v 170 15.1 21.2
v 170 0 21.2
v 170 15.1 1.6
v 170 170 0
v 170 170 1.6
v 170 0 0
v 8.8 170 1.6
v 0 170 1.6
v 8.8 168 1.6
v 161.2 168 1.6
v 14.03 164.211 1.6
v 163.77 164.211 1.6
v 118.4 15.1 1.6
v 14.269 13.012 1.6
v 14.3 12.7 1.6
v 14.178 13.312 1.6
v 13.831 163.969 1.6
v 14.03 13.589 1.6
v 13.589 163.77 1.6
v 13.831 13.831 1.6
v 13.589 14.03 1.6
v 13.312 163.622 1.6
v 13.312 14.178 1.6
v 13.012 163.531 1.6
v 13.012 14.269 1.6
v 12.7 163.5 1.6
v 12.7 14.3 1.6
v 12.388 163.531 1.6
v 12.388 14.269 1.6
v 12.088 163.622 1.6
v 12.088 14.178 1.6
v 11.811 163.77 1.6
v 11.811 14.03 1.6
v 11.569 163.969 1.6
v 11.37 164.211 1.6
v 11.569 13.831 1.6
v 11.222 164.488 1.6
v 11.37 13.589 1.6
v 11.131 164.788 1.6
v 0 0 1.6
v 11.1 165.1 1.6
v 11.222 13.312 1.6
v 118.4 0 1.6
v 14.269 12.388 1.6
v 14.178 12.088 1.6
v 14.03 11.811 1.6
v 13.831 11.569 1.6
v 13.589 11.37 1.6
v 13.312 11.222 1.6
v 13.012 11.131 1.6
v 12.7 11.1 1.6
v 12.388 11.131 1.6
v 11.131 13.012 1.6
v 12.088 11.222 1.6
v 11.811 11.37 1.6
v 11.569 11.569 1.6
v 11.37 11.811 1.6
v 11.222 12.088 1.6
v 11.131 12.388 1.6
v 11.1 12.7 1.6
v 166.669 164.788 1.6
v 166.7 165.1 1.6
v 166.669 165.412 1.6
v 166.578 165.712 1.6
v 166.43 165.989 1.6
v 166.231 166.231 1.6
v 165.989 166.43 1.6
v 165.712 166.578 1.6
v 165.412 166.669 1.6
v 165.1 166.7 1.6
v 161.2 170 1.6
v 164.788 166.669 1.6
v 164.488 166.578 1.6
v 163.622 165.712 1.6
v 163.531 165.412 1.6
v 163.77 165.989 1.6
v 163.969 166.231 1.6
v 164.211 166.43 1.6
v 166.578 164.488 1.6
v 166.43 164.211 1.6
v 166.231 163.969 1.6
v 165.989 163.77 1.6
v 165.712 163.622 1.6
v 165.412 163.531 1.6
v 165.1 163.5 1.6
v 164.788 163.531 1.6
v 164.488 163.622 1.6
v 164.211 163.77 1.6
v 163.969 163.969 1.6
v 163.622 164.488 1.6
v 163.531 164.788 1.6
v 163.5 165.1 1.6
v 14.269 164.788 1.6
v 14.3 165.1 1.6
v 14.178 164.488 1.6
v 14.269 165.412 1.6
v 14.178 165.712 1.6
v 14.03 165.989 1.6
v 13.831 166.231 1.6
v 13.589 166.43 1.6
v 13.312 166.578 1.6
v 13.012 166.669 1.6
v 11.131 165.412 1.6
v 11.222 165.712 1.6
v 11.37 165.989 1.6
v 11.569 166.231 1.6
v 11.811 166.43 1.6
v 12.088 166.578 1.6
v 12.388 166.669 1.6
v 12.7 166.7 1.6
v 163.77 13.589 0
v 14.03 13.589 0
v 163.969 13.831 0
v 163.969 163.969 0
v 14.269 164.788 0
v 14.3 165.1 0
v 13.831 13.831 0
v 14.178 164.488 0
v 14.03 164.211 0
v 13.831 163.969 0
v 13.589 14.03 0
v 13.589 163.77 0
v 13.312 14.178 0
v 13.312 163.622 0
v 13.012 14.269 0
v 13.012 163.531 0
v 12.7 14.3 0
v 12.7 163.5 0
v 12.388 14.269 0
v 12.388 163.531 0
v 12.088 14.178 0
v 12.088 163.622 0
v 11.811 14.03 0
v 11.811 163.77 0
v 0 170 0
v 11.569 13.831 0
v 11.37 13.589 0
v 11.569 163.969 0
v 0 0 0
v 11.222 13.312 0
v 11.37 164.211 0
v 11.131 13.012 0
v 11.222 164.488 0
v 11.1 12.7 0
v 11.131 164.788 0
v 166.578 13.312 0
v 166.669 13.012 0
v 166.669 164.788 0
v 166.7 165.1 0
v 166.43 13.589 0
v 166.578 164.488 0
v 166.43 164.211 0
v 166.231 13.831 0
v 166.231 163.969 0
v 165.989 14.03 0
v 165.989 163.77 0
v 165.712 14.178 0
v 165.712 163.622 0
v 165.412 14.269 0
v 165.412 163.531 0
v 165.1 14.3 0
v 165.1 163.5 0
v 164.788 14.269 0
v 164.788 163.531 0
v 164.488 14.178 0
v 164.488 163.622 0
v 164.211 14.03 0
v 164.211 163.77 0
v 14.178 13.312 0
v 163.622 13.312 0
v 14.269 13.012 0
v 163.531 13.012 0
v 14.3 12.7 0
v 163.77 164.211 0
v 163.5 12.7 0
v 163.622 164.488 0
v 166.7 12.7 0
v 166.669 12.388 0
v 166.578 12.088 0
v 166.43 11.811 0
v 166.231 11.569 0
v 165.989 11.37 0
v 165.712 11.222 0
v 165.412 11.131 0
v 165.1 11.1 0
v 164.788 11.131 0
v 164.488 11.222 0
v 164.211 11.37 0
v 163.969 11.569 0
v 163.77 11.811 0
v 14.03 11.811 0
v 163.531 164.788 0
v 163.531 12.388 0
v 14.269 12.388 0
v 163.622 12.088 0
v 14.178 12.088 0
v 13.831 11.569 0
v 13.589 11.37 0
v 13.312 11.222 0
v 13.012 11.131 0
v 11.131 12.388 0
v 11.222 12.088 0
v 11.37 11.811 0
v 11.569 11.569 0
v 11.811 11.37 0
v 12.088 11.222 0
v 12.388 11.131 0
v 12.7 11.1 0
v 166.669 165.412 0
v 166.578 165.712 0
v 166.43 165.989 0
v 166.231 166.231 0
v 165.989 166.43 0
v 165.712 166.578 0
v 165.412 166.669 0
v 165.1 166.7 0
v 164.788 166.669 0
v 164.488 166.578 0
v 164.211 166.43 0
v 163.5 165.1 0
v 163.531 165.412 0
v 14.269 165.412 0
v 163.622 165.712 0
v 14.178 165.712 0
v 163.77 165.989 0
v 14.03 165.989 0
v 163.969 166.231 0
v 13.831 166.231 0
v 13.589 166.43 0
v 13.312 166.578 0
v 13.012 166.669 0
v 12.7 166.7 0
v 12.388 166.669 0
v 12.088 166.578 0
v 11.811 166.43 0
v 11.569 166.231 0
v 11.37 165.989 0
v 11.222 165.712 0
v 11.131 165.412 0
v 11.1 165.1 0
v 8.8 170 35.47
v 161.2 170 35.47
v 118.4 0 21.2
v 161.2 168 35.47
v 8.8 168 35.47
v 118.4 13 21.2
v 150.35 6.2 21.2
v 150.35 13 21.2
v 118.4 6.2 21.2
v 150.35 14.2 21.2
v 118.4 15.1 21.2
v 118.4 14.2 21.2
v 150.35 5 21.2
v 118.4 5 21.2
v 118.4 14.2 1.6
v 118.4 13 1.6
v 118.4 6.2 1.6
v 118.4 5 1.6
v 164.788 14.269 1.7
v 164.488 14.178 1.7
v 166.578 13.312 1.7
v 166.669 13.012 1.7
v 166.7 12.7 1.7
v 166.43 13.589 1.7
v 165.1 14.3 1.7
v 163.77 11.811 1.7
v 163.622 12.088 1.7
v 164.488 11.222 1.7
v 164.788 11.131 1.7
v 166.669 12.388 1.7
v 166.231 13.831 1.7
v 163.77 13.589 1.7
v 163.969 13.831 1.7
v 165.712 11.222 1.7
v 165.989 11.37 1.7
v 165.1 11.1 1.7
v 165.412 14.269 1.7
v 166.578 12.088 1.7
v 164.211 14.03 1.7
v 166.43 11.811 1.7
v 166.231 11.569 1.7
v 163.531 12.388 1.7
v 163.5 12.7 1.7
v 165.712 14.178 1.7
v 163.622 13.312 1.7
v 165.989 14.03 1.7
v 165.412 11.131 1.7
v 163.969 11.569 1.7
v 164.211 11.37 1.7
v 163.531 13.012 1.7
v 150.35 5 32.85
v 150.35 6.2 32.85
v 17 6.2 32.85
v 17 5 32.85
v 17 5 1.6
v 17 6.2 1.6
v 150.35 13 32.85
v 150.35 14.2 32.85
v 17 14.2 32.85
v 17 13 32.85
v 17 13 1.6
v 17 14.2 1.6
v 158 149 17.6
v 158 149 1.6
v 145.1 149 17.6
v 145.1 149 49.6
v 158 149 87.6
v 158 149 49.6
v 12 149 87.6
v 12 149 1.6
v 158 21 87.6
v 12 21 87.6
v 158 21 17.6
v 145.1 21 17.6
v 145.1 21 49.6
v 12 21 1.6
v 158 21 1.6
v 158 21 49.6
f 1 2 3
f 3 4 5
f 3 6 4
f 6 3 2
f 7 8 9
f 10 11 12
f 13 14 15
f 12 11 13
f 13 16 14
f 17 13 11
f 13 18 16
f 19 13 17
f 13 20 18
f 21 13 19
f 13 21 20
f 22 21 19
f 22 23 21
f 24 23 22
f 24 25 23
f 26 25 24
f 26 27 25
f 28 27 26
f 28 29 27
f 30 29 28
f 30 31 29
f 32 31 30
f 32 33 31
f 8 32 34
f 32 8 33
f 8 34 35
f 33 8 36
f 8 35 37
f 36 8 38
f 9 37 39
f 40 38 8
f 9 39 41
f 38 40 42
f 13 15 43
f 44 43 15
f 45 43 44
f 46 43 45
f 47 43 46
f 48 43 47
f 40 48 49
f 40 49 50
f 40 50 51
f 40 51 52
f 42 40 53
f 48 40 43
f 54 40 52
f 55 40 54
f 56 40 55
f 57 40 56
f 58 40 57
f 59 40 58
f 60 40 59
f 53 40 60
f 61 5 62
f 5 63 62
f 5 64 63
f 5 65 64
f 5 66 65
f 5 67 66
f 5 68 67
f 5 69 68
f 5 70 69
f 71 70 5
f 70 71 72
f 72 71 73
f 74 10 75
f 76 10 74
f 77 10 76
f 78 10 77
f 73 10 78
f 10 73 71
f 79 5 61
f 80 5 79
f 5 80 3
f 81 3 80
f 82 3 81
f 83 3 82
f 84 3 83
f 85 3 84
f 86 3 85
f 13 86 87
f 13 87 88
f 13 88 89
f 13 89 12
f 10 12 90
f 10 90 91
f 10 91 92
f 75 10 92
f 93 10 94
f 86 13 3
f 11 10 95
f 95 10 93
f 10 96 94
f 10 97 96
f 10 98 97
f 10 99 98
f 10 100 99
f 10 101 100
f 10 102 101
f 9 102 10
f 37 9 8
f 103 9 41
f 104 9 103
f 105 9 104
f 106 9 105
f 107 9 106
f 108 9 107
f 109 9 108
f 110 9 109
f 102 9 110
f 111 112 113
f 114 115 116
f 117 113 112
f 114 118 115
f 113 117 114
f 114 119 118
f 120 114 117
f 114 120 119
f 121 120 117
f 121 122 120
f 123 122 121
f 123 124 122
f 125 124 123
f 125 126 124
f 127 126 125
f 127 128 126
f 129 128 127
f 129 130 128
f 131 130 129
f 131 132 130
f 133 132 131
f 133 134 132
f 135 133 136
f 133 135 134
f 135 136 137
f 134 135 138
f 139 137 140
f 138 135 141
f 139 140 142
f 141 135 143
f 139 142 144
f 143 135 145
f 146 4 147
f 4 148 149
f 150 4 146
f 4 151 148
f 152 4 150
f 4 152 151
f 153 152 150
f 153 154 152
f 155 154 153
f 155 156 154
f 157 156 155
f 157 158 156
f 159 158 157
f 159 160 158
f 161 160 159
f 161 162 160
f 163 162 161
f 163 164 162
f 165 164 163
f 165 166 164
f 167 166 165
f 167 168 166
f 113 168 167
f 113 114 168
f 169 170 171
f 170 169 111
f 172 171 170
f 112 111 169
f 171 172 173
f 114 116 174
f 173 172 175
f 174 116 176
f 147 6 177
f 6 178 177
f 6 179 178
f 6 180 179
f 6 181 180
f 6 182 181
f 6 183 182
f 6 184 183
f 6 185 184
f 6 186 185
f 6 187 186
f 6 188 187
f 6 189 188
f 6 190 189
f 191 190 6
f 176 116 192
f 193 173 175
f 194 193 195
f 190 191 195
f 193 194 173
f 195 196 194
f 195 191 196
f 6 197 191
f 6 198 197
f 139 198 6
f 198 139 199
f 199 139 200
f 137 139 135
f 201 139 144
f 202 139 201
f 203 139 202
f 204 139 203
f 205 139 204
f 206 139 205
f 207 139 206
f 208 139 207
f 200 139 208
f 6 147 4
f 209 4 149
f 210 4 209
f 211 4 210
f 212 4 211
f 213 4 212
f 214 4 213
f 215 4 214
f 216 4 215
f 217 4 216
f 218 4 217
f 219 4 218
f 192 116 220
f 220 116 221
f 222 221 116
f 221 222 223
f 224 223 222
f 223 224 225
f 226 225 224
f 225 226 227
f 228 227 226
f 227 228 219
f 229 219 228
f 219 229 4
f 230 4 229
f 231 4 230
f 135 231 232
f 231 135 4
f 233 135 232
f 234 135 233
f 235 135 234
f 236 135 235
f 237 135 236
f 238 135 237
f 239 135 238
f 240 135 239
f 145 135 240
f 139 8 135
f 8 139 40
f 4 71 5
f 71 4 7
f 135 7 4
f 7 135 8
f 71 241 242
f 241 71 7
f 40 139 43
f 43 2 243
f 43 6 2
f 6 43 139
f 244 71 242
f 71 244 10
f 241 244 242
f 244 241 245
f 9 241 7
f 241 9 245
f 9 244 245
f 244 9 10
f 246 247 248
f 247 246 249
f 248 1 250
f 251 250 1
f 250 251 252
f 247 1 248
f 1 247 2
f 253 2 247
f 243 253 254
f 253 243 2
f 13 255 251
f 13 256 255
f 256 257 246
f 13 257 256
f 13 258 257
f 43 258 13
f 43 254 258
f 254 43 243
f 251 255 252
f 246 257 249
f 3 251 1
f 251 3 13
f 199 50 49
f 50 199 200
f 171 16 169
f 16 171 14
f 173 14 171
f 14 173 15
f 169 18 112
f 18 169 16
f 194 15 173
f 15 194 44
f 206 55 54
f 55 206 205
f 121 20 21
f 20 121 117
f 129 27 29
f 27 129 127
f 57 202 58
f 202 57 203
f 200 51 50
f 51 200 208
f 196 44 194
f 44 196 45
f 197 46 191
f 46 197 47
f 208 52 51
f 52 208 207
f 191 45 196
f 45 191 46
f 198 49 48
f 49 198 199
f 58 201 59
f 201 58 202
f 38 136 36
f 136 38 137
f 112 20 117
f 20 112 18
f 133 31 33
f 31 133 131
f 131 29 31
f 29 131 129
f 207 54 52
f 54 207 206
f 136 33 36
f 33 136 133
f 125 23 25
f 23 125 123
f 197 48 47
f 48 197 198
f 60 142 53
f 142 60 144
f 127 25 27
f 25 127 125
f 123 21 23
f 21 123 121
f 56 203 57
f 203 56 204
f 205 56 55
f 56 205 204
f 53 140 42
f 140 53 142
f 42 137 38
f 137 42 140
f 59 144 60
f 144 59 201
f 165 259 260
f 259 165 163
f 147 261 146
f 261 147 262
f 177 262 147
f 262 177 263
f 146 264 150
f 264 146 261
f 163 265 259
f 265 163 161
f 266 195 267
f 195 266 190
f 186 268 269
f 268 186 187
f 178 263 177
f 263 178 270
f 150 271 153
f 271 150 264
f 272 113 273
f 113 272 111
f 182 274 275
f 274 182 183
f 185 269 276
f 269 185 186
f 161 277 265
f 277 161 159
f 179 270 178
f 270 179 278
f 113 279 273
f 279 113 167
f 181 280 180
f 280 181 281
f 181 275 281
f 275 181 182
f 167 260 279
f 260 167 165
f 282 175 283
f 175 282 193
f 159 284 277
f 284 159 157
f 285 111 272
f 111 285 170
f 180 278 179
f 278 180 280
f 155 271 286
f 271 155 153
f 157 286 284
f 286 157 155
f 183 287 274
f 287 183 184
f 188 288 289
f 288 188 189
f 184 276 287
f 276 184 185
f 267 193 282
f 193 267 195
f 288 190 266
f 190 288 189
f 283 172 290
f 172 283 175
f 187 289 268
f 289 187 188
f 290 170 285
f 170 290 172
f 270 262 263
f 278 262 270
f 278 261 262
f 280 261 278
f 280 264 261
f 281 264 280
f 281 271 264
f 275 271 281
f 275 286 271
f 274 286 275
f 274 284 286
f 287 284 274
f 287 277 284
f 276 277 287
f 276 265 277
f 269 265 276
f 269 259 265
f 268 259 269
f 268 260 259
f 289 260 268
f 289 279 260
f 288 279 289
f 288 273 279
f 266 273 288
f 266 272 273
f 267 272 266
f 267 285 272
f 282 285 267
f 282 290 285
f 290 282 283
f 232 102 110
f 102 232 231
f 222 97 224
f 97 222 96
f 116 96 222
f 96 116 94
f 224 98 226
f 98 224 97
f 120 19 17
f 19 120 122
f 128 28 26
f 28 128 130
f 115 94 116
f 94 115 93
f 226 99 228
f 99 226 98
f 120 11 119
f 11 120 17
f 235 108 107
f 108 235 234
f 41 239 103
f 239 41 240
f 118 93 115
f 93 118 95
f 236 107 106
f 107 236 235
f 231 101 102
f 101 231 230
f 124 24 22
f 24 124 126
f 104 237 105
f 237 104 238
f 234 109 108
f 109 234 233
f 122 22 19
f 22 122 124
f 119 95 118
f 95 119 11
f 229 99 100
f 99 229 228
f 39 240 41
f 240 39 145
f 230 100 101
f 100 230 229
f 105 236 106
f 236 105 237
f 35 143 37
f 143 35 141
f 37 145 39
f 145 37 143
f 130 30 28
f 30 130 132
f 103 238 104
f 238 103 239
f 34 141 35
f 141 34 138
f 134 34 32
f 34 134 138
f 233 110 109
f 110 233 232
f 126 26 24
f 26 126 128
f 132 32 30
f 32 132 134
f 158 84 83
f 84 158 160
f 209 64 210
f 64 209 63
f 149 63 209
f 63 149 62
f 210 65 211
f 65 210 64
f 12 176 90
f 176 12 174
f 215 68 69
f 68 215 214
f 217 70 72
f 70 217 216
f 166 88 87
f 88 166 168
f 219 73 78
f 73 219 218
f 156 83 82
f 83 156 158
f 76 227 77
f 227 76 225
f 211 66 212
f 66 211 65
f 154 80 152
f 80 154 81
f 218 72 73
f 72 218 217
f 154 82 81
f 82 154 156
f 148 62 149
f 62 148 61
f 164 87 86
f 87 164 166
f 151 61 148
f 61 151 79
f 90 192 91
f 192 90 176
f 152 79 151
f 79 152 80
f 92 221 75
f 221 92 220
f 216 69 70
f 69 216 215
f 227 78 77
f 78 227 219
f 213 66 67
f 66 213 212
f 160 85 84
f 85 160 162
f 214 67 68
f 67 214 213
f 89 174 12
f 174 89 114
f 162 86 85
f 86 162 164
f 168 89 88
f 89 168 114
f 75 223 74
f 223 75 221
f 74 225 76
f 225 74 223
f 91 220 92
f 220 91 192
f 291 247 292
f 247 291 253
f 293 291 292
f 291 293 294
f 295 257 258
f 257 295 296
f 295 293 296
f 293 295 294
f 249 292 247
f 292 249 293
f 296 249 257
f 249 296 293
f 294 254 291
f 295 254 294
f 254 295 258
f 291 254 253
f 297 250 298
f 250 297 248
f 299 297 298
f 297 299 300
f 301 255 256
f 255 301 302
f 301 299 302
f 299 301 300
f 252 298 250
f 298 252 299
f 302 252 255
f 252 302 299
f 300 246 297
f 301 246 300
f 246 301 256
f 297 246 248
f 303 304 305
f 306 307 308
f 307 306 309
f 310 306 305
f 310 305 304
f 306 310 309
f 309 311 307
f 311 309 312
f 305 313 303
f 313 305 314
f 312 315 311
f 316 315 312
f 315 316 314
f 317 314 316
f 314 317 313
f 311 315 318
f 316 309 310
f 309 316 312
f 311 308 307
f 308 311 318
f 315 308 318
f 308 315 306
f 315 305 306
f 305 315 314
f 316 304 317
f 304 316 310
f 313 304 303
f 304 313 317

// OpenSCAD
// file: ../../case/dimensions.scad
// Shared dimensions for all case components
// This file defines common parameters used across multiple case parts

// --- Wall and Material ---
wall_thickness = 3;

// --- Motherboard (Mini-ITX) ---
mobo_width = 170;
mobo_depth = 170;
mobo_pcb_thickness = 1.6;

// --- Standoffs ---
standoff_height = 6;  // Female thread portion of M3x10+6mm male-female standoff
standoff_hole_radius = 1.6;  // M3 clearance (deprecated - see integrated bottom panel design)
standoff_locations = [
    [12.7, 12.7],
    [165.1, 12.7],
    [12.7, 165.1],
    [165.1, 165.1]
];

// --- Standoff Hexagonal Receptacles (Integrated Bottom Panel Design) ---
standoff_boss_height = 2.5;              // Height of hex boss above panel interior surface
standoff_hex_size_flat_to_flat = 5.5;   // Hex size for M3 screw head (flat-to-flat)
standoff_hex_size_point_to_point = 6.35; // Hex size point-to-point (calculated from F-F)
standoff_pocket_depth = 2.2;             // Depth of hex recess for screw head
standoff_boss_diameter = 6.85;           // Overall boss diameter (hex point + FDM tolerance)
standoff_mounting_screw_length = 8;      // M3 x 8mm cap screw (recommended)
standoff_screw_clearance_hole = 3.3;     // M3 clearance hole + FDM tolerance

// --- I/O Shield ---
// Standard ATX I/O shield dimensions
io_shield_width = 158.75;   // 6.25 inches (standard ATX)
io_shield_height = 44.45;   // 1.75 inches (standard ATX)
io_shield_x_offset = (mobo_width - io_shield_width) / 2;
io_shield_z_offset = 5;     // 5mm from bottom of plate

// --- Backplate ---
backplate_height = 88.9;    // 3.5 inches
backplate_thickness = wall_thickness;

// --- CPU Cooler (Noctua NH-L12S) - Minimal/NAS configurations ---
cooler_width = 128;
cooler_depth = 146;
cooler_base_height = 35;      // Base plate and heatpipes
cooler_fan_height = 15;       // 120mm x 15mm fan (NF-A12x15)
cooler_fins_height = 20;      // Heatsink fins on top
cooler_total_height = cooler_base_height + cooler_fan_height + cooler_fins_height;  // 70mm

// --- CPU Cooler (Noctua NH-L9) - Pico configuration ---
cooler_nh_l9_width = 95;
cooler_nh_l9_depth = 95;
cooler_nh_l9_base_height = 5;       // CPU contact base
cooler_nh_l9_heatsink_height = 18;  // Aluminum fins
cooler_nh_l9_fan_height = 14;       // 92mm x 14mm fan
cooler_nh_l9_total_height = cooler_nh_l9_base_height + cooler_nh_l9_heatsink_height + cooler_nh_l9_fan_height;  // 37mm

// --- Power Supplies ---
// Flex ATX (from technical drawing)
// Standing orientation: 40mm wide (X), 150mm deep (Y), 80mm tall (Z)
flex_atx_width = 40.0;      // A: Width (X - thin side, standing)
flex_atx_length = 150.0;    // B: Length (Y - depth)
flex_atx_height = 80.0;     // G: Height (Z - tall side, standing)

// Flex ATX Mounting holes - 8-32 UNC thread (4 places on rear 40x80mm face)
flex_atx_mount_hole_radius = 2.1;   // 8-32 clearance (~4.2mm dia)
flex_atx_mount_x_inset = 5;         // Distance from left/right edges (corrected from 12.5)
flex_atx_mount_z_inset = 5;         // Distance from top/bottom edges (corrected from 8.25)

// Calculated mounting hole positions (X, Z pairs relative to PSU origin)
// Note: Only 3 holes - top-right (coords) removed where C14 inlet is located
// When viewing from back: top-right (coords) = top-left (view)
flex_atx_mount_holes = [
    [flex_atx_mount_x_inset, flex_atx_mount_z_inset],                                    // Bottom-left (coords) = Bottom-right (view)
    [flex_atx_width - flex_atx_mount_x_inset, flex_atx_mount_z_inset],                   // Bottom-right (coords) = Bottom-left (view)
    [flex_atx_mount_x_inset, flex_atx_height - flex_atx_mount_z_inset]                   // Top-left (coords) = Top-right (view)
    // Top-right (coords) removed - C14 power inlet is here = Top-left (view)
];

// SFX
sfx_length = 125;
sfx_width = 100;
sfx_height = 63.5;

// --- HDD 3.5" Dimensions ---
hdd_width = 101.6;
hdd_length = 147;
hdd_height = 26.1;

// --- NAS 2-Disk Config ---
// 2 HDDs side-by-side (controlling dimension for case width)
// See SPEC.md Section 3.3 for design rationale
nas_2disk_rail_width = 2;
nas_2disk_gap = 5;           // Gap between bays
nas_2disk_padding = 2;       // Clearance around HDDs
nas_2disk_bay_width = hdd_width + 2 * nas_2disk_rail_width;  // ~105.6mm per bay
nas_2disk_inner_width = 2 * nas_2disk_bay_width + nas_2disk_gap;  // ~216.2mm
nas_2disk_width = nas_2disk_inner_width + 2 * (wall_thickness + nas_2disk_padding);  // ~226mm

// --- PSU Compartment ---
// Flex ATX PSU in standing orientation (40mm width)
flex_atx_standing_width = flex_atx_width;  // 40mm (already in standing orientation)
psu_compartment_width = nas_2disk_width - mobo_width;  // ~56mm (40mm PSU + 16mm clearance)

// --- Interior Chamber Height (standoffs + motherboard + cooler) ---
interior_chamber_height = standoff_height + mobo_pcb_thickness + cooler_total_height;  // ~94mm

// --- Minimal Config External Dimensions ---
// Motherboard area only (without PSU)
minimal_mobo_exterior_width = mobo_width + 2 * wall_thickness;   // 176mm
minimal_mobo_exterior_depth = mobo_depth + 2 * wall_thickness;   // 176mm
minimal_exterior_height = interior_chamber_height + 2 * wall_thickness;   // ~100mm

// With Flex ATX PSU next to motherboard
// Width controlled by NAS 2-disk HDD layout (see SPEC.md Section 3.3)
minimal_with_psu_width = nas_2disk_width;  // ~226mm (PSU compartment = 56mm, PSU on side = 40mm)

// --- Interior Panel Dimensions (top/bottom panels fit between walls) ---
interior_panel_width = minimal_with_psu_width - 2 * wall_thickness;  // ~220mm
interior_panel_depth = mobo_depth;                                    // 170mm

// --- Side Panel Dimensions (left/right panels form exterior walls) ---
side_panel_height = minimal_exterior_height;                          // ~100mm
side_panel_depth = mobo_depth + 2 * wall_thickness;                   // 176mm

// --- Front/Back Panel Dimensions (fit between side walls, full exterior height) ---
front_back_panel_width = interior_panel_width;                        // ~220mm
front_back_panel_height = side_panel_height;                          // ~100mm (full exterior)

// --- Ventilation ---
honeycomb_radius = 3;
vent_padding = 5;

// --- Screw Holes for Panel Assembly ---
panel_screw_radius = 1.6;  // M3
panel_screw_inset = 8;     // Distance from edge

// --- GPU ---
gpu_length = 320;          // Max GPU length
gpu_height = 140;          // GPU PCB + cooler height
gpu_width = 60;            // 3 slots

// --- GPU Config External Dimensions ---
// From SPEC.md Section 8.4
gpu_config_width = 171;    // mm
gpu_config_depth = 378;    // mm
gpu_config_height = 190;   // mm

// --- Fans ---
fan_120_size = 120;
fan_120_thickness = 25;
fan_140_size = 140;
fan_140_thickness = 25;

// --- AIO Radiator ---
radiator_240_length = 275;
radiator_240_width = 120;
radiator_240_thickness = 27;

// --- NAS Many-Disk Config ---
// 5-8 drives mounted vertically (on narrowest side)
nas_many_drive_count = 6;  // Default 6 drives
nas_many_drive_spacing = 5;
nas_many_enclosure_height = hdd_width + wall_thickness + 5;  // ~110mm (drives on side)

// --- Power Inlet C14 ---
c14_width = 50;
c14_height = 27;
c14_depth = 30;

// --- Open Air Frame ---
// Frame cylinder height (from motherboard surface to inside panel face)
// Derived: interior_chamber_height - standoff_height - mobo_pcb_thickness
frame_cylinder_height = interior_chamber_height - standoff_height - mobo_pcb_thickness;  // ~86mm
frame_cylinder_outer_diameter = 8;     // Outer diameter
frame_cylinder_inner_diameter = 3.2;   // M3 clearance for standoff stud
frame_cylinder_thread_depth = 6;       // Matches extended_standoff_male_height (M3x6+6mm)
// file: ../ram.scad
// A module for a single DDR4 RAM stick
module ram_stick() {
    ram_l = 133.35;
    ram_h = 31.25;
    ram_t = 1.2;
    cube([ram_l, ram_t, ram_h]);
}
// file: motherboard.scad
// A module to create a rudimentary Mini-ITX motherboard model
// Includes mounting holes at standard Mini-ITX positions
// Note: Standoffs are now part of base_assembly, not the motherboard module

include <../../case/dimensions.scad>

module motherboard() {
    mobo_width = 170;
    mobo_depth = 170;
    mobo_thickness = 1.6;

    io_shield_width = 152.4;
    io_shield_height = 33.87;
    io_shield_thickness = 2;
    io_shield_x_offset = (mobo_width - io_shield_width) / 2;

    // ATX 24-pin connector dimensions
    atx_conn_l = 51.6;
    atx_conn_w = 15.1;
    atx_conn_h = 19.6;

    union() {
        // Motherboard PCB with mounting holes
        color("purple") {
            difference() {
                union() {
                    // Motherboard PCB
                    cube([mobo_width, mobo_depth, mobo_thickness]);
                    // I/O Shield
                    translate([io_shield_x_offset, mobo_depth - io_shield_thickness, mobo_thickness]) {
                        cube([io_shield_width, io_shield_thickness, io_shield_height]);
                    }
                    // 24-pin ATX Connector
                    translate([mobo_width - atx_conn_l, 0, mobo_thickness]) {
                        cube([atx_conn_l, atx_conn_w, atx_conn_h]);
                    }
                }
                // Mounting holes at Mini-ITX standoff locations
                for (pos = standoff_locations) {
                    translate([pos[0], pos[1], -0.1]) {
                        cylinder(h = mobo_thickness + 0.2, r = standoff_hole_radius, $fn = 32);
                    }
                }
            }
        }

        // Note: Standoffs removed from motherboard module (legacy code)
        // Standoffs are now part of base_assembly (integrated bottom panel design)
        // See modules/case/base/base_assembly.scad
    }
}

// Preview
motherboard();
// file: ../cpu_cooler.scad
// A module for the Noctua NH-L12S CPU cooler
// Fan mounted UNDER heatsink (closest to motherboard)
module noctua_nh_l12s() {
    heatsink_w = 128;
    heatsink_d = 146;
    heatsink_h = 70;

    fan_w = 128;
    fan_d = 146;
    fan_h = 16;

    // RAM cutout dimensions (in heatsink)
    ram_cutout_w = 134;
    ram_cutout_d = 13;
    ram_cutout_h = 32;

    union() {
        // Fan (at bottom, closest to motherboard)
        color("tan") {
            cube([fan_w, fan_d, fan_h]);
        }

        // Heatsink (on top of fan)
        color("silver") {
            translate([0, 0, fan_h]) {
                difference() {
                    cube([heatsink_w, heatsink_d, heatsink_h]);
                    // RAM Cutout (from bottom of heatsink)
                    translate([(heatsink_w - ram_cutout_w)/2, -0.1, 0]) {
                        cube([ram_cutout_w, ram_cutout_d, ram_cutout_h]);
                    }
                }
            }
        }
    }
}

// Preview
noctua_nh_l12s();
// file: motherboard_with_ram.scad
// Motherboard with RAM Assembly
// Contains: Mini-ITX motherboard + 2x RAM sticks
// Use this as foundation for cooler-specific assemblies
//
// Coordinate System:
// X-axis: 0 = left side, increases toward right
// Y-axis: 0 = front, increases toward back
// Z-axis: 0 = bottom of motherboard PCB, increases upward

use <motherboard.scad>
use <../ram.scad>

// Motherboard PCB thickness (needed for component positioning)
mobo_pcb_thickness = 1.6;

module motherboard_with_ram() {
    union() {
        // Motherboard PCB with I/O shield
        motherboard();

        // RAM (2 sticks, 5mm from front, 17mm from left of motherboard)
        // Stick spacing: 8mm between sticks
        translate([17, 5, mobo_pcb_thickness]) {
            ram_stick();
            translate([0, 8, 0]) {
                ram_stick();
            }
        }
    }
}

// Preview
motherboard_with_ram();
// main file
// Motherboard Full Mini-ITX Assembly
// Contains: motherboard_with_ram + NH-L12S cooler
// For minimal, NAS 2-disk, NAS many-disk configurations
//
// Coordinate System:
// X-axis: 0 = left side, increases toward right
// Y-axis: 0 = front, increases toward back
// Z-axis: 0 = bottom of motherboard PCB, increases upward

use <motherboard_with_ram.scad>
use <../cpu_cooler.scad>

// Motherboard PCB thickness (needed for cooler positioning)
mobo_pcb_thickness = 1.6;

module motherboard_full_minitx() {
    union() {
        // Base motherboard + RAM
        motherboard_with_ram();

        // CPU Cooler (Noctua NH-L12S)
        // Rotated 90° CCW, positioned over CPU socket area
        translate([158, 21, mobo_pcb_thickness]) {
            rotate([0, 0, 90]) {
                noctua_nh_l12s();
            }
        }
    }
}

// Preview
motherboard_full_minitx();
